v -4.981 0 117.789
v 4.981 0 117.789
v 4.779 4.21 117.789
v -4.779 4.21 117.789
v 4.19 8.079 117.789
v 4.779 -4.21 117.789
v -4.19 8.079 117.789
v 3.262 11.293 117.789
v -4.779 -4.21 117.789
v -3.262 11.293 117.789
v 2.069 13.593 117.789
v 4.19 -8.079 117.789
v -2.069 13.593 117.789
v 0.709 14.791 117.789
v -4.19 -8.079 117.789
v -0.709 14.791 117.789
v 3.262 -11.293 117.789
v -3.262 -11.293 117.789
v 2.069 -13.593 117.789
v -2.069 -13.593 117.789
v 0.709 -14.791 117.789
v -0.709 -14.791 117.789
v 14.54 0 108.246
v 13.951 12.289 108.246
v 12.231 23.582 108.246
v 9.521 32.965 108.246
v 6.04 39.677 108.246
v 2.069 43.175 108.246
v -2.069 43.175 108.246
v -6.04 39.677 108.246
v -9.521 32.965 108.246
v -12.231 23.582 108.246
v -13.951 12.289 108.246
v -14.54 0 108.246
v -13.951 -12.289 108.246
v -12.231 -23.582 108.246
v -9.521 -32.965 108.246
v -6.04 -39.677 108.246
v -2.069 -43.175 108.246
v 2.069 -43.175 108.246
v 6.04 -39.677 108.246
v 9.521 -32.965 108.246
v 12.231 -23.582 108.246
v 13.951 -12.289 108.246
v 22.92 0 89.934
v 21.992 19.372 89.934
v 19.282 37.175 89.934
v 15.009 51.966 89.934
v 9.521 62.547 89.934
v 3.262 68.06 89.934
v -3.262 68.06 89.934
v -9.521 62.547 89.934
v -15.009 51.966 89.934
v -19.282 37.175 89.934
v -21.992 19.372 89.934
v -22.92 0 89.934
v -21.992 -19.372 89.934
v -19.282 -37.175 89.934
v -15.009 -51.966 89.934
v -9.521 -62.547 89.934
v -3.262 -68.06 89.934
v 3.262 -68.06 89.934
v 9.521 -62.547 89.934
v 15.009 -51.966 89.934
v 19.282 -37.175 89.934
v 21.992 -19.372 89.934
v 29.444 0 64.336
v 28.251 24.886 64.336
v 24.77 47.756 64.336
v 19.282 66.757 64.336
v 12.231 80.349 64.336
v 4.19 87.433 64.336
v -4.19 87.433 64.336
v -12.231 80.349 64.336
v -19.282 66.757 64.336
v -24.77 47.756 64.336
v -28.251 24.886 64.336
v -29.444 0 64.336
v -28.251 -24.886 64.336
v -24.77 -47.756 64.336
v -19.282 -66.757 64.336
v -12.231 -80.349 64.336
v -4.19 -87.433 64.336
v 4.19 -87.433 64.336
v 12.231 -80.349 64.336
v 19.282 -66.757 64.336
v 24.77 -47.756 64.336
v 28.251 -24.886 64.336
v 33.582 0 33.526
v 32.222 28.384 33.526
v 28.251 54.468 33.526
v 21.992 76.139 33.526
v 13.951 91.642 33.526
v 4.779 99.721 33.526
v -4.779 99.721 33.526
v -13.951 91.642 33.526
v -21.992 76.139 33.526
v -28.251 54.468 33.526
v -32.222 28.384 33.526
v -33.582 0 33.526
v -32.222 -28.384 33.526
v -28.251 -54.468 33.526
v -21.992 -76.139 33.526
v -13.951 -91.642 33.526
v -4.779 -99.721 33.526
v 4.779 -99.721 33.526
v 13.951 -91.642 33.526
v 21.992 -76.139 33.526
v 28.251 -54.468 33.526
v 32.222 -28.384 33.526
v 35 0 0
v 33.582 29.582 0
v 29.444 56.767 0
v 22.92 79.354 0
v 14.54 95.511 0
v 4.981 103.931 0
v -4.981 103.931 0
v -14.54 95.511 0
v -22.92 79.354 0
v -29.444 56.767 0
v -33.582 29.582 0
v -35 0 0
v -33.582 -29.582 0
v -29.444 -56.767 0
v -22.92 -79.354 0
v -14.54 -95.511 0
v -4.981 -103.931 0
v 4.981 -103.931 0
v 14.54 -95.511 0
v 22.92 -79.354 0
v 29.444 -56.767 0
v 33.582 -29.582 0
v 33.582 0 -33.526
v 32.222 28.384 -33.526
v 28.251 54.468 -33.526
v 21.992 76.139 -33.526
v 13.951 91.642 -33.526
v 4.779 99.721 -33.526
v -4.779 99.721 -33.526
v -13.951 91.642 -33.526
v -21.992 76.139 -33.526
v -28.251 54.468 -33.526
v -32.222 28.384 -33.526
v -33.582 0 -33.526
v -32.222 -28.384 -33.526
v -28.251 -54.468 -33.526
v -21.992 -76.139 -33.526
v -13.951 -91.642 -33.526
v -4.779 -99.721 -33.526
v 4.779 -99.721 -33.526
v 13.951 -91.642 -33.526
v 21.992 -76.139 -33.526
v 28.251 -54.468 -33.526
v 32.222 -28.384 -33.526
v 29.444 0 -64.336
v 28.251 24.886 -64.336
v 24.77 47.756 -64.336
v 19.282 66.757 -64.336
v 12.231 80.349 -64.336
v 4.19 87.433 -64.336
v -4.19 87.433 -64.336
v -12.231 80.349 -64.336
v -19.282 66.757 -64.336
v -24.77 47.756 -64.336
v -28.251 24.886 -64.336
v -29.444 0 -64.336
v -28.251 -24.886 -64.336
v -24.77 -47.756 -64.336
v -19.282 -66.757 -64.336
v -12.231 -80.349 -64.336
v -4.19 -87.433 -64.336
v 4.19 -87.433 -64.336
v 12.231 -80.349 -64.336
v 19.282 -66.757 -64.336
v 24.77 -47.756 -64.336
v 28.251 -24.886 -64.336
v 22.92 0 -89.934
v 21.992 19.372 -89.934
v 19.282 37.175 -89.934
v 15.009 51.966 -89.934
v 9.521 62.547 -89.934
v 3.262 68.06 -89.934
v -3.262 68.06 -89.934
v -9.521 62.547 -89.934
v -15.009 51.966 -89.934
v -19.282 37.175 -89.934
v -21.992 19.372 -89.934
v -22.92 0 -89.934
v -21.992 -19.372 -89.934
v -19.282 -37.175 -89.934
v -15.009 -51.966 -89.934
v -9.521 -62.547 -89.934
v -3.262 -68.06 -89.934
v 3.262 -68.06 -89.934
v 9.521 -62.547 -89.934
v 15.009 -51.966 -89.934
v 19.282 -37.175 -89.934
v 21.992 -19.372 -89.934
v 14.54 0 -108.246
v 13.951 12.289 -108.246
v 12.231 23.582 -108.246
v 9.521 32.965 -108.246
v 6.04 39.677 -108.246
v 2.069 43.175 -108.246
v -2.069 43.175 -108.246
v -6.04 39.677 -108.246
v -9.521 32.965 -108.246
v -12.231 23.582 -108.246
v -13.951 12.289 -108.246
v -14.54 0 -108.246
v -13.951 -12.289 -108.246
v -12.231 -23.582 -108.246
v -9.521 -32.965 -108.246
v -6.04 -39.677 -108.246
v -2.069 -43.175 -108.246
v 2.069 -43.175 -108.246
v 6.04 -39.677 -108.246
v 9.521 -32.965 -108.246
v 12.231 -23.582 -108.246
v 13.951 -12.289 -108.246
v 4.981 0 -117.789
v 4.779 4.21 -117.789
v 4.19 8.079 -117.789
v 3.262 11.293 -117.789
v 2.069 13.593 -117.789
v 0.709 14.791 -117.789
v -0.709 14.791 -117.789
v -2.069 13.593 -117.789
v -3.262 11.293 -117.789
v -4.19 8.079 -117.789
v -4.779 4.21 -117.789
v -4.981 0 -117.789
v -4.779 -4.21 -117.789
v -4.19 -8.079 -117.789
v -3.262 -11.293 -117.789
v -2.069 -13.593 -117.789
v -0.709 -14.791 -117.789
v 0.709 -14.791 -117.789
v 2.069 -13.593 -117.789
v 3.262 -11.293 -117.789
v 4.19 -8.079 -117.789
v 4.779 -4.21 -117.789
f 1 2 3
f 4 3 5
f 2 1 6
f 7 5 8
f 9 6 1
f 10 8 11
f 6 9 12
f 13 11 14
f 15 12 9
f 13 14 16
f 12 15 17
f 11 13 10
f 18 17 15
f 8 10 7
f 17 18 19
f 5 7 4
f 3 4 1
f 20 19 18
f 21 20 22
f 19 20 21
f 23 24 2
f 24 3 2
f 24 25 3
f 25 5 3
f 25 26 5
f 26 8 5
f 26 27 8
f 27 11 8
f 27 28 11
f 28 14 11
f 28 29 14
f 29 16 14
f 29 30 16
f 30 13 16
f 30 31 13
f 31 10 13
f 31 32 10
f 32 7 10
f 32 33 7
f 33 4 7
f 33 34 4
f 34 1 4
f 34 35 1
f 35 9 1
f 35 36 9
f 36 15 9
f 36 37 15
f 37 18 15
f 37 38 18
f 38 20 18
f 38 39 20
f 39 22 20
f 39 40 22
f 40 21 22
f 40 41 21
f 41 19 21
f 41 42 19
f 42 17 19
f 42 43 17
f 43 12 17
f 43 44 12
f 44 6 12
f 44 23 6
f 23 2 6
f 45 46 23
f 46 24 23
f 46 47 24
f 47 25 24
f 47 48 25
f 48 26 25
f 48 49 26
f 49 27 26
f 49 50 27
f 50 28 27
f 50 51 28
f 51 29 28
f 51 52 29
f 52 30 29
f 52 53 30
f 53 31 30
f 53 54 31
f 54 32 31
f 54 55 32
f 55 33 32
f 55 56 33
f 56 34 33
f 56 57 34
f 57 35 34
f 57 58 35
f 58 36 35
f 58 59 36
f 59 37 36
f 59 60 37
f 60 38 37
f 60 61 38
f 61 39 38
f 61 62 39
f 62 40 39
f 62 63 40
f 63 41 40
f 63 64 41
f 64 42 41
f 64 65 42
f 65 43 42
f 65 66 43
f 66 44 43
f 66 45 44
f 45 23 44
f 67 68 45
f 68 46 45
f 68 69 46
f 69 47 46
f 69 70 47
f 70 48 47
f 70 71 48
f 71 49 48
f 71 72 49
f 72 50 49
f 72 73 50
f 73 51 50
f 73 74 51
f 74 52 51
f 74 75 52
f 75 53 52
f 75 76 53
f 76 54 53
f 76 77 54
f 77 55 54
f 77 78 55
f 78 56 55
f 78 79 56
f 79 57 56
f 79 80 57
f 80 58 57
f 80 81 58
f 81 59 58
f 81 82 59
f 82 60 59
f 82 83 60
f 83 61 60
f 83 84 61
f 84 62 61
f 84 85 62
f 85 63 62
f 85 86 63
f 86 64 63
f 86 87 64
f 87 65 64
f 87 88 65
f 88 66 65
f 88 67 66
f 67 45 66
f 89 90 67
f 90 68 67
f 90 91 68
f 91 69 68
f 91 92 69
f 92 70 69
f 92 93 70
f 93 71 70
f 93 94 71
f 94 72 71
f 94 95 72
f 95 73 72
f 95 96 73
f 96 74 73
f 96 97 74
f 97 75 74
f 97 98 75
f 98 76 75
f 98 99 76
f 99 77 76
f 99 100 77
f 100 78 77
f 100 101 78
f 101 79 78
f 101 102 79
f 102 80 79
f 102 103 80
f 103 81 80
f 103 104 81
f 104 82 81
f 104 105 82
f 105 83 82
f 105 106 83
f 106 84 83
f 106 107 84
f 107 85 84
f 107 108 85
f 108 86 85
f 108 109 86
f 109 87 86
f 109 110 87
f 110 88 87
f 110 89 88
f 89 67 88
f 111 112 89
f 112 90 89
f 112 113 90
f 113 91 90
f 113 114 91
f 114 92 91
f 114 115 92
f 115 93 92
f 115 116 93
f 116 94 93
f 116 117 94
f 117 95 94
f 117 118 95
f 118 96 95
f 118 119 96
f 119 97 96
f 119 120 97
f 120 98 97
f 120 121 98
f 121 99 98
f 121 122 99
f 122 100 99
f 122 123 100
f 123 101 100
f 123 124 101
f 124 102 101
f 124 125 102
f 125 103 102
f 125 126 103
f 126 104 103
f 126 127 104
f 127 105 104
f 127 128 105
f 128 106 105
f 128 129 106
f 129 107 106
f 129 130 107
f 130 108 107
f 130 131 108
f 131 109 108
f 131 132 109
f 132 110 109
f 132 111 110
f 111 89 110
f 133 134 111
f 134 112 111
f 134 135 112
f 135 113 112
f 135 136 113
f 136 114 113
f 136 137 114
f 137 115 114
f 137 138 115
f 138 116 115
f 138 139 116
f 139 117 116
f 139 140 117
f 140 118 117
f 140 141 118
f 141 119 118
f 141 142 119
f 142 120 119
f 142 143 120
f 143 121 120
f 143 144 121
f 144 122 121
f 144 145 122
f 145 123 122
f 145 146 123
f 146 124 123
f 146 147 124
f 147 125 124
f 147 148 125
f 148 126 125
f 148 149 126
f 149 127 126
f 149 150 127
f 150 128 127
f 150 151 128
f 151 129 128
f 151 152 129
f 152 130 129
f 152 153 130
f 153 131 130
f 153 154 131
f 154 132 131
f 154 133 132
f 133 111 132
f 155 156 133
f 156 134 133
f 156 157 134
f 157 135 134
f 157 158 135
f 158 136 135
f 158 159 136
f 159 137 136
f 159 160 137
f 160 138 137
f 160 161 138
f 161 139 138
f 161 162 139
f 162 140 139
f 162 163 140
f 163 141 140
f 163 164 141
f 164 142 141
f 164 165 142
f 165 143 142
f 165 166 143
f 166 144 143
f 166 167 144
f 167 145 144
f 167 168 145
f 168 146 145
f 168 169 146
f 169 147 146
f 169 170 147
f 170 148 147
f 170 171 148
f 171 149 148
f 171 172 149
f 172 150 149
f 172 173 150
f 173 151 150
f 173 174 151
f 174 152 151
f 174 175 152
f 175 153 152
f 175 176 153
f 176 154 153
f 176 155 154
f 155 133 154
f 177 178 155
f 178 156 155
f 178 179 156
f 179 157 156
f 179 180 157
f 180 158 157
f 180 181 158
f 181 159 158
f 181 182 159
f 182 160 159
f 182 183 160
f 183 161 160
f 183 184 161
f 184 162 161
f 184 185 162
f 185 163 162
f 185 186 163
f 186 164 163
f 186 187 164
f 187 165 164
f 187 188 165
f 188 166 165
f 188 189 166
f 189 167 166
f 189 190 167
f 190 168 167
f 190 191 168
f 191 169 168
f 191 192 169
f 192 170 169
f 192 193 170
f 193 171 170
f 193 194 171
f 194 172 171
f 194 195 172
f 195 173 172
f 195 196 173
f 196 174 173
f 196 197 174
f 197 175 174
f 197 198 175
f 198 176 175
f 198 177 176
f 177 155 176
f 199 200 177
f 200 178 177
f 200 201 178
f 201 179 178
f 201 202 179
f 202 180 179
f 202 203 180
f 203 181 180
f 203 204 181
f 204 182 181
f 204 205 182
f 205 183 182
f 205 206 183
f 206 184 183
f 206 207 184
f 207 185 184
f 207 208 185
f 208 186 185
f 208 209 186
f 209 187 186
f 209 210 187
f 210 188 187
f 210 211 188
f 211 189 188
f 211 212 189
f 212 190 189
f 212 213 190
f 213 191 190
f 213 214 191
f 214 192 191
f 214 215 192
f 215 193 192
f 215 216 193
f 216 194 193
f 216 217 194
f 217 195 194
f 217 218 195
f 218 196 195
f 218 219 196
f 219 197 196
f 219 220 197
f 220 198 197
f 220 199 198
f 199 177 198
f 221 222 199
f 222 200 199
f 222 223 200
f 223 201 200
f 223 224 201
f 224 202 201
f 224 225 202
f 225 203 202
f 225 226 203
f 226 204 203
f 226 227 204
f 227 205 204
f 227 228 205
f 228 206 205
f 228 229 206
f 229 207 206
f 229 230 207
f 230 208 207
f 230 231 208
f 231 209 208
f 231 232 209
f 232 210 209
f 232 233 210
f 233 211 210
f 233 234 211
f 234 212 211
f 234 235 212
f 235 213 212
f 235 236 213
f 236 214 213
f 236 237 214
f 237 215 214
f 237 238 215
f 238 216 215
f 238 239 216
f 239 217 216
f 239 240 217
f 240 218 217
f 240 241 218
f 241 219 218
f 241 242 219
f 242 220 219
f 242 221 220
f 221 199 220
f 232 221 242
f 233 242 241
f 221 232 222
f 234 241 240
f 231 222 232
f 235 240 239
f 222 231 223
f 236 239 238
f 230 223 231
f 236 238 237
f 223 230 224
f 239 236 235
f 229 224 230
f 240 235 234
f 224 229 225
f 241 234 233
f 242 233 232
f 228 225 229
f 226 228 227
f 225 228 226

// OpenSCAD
// Generated by SolidPython 1.0.1 on 2020-07-29 00:46:46


scale(v = [5, 15, 17]) {
	sphere(r = 7);
}
/***********************************************
*********      SolidPython code:      **********
************************************************
 
# import packages: SolidPython
from solid import *
from solid.utils import *
from itertools import chain, combinations, permutations


class Resize:

    def __init__(self, scad_file):
        self.scad_file = scad_file
        #self.scad_file = import_scad(scad_file)
        # cone/cylinder param:
        self.r1 = 0
        self.r2 = 0
        self.h = 0
        # rectangular prism param:
        self.w = 0
        self.l = 0
        # ellipse param:
        self.r = 0

    # import OpenScad code (file name corresponds to shape)


    # classify shape + parameters
    def assign(self, param1, param2, param3):
        if self.scad_file == 'cone.scad':
            self.r1 = param1
            self.r2 = param2
            self.h = param3
        elif self.scad_file == 'cylinder.scad':
            self.r1 = param1
            self.r2 = param2
            self.h = param3
        elif self.scad_file == 'rectangularPrism.scad':
            self.h = param1
            self.l = param2
            self.w = param3
        else:
            self.r = param1
            self.h = param2

    # resize parameters
    def iterate(self):
        x = range(3, 20, 2)
        i = 1
        if self.scad_file == 'cone.scad':
            tempList = list(permutations(x, 2))
            for temp in tempList:
                param1 = temp[0]
                param2 = temp[1]
                filepath = 'produced_scad_files/' + 'cone' + str(param1) + '_' + str(param2) + '_' + '.scad'
                scad_render_to_file(cylinder(h=param1, r1=param2, r2=0), filepath)

        elif self.scad_file == 'cylinder.scad':
            tempList = list(permutations(x, 3))
            for temp in tempList:
                param1 = temp[0]
                param2 = temp[1]
                filepath = 'produced_scad_files/' + 'cylinder' + str(param1) + '_' + str(param2) + '_' + '.scad'
                scad_render_to_file(cylinder(h=param1, r1=param2, r2=param2), filepath)

        elif self.scad_file == 'rectangularPrism.scad':
            tempList = list(permutations(x, 3))
            for temp in tempList:
                param1 = temp[0]
                param2 = temp[1]
                param3 = temp[2]
                filepath = 'produced_scad_files/' + 'rectangularPrism' + str(param1) + '_' + str(param2) + '_' + str(
                    param3) + '.scad'
                scad_render_to_file(cube(size=(param1, param2, param3)), filepath)

        elif self.scad_file == 'ellipse.scad':
            tempList = list(permutations(x, 4))
            for temp in tempList:
                param1 = temp[0]
                param2 = temp[1]
                param3 = temp[2]
                param4 = temp[3]
                filepath = 'produced_scad_files/' + 'ellipse' + str(param1) + '_' + str(param2) + '_' + str(param3) + '_' + str(param4) + '.scad'
                scad_render_to_file(scale([param1, param2, param3])(sphere(r=param4)), filepath)

    def render_to_scadfile(self):
        scad_render_to_file(scad, 'example.scad') 
 
************************************************/
